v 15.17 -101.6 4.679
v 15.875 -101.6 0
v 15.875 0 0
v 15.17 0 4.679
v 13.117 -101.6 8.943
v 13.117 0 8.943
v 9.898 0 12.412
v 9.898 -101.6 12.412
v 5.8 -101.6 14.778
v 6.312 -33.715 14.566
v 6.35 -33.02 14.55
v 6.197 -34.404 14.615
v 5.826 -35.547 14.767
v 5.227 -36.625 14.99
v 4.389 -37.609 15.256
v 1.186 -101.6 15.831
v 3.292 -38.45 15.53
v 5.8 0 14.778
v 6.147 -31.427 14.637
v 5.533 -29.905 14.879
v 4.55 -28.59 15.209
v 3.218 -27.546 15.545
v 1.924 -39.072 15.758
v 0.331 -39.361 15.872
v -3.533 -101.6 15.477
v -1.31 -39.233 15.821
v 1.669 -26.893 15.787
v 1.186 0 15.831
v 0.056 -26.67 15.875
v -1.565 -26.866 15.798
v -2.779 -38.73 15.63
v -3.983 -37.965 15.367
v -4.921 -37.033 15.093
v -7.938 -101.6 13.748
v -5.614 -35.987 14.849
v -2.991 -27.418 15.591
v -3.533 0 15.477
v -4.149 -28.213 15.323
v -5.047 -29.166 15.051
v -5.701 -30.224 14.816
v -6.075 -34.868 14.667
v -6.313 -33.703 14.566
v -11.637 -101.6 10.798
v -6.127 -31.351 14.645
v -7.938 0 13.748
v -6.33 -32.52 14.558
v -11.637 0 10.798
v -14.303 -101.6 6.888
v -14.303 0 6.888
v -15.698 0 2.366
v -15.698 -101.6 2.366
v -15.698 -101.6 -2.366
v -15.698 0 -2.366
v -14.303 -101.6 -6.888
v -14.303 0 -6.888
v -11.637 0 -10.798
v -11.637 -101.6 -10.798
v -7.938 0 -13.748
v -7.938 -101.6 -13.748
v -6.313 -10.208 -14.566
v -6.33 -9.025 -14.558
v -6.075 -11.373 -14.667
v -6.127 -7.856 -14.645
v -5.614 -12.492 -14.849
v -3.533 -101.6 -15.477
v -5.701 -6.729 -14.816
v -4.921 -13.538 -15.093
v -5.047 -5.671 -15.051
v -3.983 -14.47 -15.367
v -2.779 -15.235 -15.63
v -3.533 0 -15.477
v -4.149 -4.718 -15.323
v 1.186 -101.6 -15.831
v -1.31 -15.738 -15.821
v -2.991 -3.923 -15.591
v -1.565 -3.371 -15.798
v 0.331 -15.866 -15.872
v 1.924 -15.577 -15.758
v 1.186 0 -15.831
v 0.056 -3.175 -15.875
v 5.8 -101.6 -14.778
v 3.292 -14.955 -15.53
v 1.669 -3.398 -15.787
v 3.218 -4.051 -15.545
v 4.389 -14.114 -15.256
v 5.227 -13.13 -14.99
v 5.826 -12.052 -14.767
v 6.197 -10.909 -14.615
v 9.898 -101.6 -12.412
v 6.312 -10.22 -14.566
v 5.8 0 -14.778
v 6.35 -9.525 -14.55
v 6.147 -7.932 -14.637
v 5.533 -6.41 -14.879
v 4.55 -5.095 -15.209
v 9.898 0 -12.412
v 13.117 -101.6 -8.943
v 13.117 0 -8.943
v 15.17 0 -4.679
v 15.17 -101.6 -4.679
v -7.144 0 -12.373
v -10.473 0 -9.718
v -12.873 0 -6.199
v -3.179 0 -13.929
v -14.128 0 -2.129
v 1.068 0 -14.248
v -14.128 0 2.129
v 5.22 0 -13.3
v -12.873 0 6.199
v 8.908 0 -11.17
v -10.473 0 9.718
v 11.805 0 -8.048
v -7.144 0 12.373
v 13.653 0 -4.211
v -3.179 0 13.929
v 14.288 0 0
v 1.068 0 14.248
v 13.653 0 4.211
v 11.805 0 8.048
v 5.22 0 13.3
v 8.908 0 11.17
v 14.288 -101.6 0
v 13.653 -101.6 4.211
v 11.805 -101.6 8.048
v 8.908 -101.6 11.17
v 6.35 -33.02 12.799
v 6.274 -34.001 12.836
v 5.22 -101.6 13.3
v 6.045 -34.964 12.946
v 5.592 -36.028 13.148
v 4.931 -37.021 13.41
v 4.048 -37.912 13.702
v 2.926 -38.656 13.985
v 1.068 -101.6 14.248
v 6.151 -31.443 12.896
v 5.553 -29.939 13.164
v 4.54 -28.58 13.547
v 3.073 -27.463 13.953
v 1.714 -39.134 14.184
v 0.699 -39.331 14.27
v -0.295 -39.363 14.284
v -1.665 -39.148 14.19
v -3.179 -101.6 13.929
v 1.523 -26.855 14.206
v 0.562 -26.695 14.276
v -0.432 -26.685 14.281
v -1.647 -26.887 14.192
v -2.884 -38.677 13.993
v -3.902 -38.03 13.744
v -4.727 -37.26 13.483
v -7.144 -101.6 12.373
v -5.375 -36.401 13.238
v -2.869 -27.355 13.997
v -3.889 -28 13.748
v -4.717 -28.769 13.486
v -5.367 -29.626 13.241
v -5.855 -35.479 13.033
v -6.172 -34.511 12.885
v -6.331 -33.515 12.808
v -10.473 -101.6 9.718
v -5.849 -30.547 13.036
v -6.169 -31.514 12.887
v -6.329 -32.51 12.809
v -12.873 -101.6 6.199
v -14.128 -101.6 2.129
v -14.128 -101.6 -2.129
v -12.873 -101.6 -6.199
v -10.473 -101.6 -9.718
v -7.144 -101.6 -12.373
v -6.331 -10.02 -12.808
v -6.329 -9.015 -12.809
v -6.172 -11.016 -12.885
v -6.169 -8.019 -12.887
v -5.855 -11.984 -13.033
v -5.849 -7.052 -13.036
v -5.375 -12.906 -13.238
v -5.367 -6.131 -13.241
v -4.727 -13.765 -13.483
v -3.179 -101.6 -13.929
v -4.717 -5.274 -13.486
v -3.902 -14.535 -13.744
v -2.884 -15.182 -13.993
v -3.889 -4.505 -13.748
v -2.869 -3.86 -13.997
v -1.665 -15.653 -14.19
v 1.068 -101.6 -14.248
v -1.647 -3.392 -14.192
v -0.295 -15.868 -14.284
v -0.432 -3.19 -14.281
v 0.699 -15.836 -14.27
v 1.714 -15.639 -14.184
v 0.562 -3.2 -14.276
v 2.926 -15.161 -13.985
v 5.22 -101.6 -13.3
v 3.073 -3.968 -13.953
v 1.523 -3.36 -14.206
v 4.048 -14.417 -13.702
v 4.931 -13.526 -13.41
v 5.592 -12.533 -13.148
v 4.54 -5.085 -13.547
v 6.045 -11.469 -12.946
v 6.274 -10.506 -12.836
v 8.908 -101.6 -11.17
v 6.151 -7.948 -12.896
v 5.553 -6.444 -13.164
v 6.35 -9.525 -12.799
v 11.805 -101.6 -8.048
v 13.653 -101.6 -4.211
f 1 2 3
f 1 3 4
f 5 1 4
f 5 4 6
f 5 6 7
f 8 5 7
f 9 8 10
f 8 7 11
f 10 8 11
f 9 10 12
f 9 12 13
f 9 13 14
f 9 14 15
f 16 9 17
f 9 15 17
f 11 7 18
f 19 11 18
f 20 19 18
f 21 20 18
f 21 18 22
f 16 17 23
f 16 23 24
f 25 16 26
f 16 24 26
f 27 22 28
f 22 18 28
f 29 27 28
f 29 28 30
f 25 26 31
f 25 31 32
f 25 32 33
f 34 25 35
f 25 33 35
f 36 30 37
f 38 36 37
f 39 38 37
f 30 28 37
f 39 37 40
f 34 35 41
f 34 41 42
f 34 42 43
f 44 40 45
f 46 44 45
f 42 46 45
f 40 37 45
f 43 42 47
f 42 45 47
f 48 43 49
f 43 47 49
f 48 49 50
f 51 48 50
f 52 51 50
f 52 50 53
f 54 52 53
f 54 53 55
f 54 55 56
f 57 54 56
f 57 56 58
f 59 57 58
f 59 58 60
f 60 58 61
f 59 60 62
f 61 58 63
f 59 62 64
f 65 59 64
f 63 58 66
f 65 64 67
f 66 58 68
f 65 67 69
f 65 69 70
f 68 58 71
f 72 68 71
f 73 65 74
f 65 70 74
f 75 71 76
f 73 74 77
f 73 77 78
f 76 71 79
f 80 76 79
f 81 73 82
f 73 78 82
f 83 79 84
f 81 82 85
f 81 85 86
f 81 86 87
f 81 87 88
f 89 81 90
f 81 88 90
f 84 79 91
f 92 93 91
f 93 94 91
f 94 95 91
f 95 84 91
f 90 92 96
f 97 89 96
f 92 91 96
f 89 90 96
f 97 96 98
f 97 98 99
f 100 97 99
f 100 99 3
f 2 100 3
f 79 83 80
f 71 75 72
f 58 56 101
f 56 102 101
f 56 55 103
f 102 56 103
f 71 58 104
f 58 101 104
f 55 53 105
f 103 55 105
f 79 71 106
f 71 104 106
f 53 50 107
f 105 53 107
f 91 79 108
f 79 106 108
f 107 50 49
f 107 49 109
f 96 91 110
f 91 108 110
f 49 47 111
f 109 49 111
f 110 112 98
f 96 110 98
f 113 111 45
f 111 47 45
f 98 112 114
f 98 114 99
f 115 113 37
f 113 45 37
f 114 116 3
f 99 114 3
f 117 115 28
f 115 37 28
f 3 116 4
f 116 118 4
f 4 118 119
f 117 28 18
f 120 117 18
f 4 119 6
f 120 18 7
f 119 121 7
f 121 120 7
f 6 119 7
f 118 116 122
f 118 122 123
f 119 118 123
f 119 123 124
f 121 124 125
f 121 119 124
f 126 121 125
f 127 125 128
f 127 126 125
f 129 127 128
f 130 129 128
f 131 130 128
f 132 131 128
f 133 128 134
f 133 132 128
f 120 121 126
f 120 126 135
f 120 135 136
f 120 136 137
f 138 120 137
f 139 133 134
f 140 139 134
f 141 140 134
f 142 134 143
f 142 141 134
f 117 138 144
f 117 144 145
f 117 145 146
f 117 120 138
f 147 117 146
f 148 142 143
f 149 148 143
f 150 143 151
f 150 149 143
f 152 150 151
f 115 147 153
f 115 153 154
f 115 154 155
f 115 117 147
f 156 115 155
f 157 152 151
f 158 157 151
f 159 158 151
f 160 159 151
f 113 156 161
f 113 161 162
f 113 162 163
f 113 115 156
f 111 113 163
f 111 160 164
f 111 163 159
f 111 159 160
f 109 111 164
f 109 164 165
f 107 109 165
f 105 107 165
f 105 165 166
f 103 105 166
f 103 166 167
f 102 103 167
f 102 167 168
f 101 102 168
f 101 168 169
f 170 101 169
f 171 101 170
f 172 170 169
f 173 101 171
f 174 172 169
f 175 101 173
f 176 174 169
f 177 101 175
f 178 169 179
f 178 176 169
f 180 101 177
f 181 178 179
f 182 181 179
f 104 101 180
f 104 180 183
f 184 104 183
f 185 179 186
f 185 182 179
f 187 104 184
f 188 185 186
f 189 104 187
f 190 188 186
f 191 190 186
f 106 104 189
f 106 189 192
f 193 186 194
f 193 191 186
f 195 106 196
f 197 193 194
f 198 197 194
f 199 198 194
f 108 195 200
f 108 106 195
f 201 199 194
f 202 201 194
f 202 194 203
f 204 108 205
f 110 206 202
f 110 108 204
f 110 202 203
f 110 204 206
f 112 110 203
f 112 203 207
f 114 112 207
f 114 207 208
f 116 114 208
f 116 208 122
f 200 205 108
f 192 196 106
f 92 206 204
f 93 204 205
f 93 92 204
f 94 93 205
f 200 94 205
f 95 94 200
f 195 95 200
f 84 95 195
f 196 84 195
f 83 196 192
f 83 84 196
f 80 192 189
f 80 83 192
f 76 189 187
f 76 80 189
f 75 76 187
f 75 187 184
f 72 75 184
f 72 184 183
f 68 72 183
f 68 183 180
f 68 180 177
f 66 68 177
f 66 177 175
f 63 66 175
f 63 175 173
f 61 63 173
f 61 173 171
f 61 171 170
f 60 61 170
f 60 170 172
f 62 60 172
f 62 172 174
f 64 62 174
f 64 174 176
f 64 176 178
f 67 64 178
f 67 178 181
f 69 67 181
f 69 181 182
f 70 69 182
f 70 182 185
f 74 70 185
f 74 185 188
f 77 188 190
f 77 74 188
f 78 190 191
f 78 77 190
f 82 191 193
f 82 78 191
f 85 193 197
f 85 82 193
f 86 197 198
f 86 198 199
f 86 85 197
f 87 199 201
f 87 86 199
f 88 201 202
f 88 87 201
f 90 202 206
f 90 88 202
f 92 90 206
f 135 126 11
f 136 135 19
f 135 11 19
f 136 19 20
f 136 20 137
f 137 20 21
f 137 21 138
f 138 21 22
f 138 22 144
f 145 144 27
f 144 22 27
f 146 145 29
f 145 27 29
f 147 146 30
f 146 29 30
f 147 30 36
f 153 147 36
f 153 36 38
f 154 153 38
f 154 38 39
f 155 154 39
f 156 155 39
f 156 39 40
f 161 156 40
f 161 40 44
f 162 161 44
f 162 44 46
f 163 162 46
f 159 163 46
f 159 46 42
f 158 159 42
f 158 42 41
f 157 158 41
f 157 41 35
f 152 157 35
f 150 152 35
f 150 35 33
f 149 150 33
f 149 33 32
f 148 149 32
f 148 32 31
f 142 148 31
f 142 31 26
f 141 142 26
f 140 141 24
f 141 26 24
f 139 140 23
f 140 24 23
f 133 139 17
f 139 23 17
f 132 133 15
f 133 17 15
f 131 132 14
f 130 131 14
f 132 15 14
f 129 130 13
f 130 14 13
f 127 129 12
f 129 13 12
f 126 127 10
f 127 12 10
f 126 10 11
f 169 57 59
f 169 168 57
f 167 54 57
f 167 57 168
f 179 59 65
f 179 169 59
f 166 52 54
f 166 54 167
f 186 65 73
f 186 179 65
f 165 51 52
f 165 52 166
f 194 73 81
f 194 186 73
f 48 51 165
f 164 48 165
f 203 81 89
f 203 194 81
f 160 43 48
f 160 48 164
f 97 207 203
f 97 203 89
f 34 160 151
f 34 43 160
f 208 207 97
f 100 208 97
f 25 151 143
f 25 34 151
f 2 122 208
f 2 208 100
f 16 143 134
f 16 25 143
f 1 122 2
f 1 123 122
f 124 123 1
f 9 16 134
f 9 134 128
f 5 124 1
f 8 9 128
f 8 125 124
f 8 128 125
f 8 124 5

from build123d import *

# Parameters (mm, degrees)
F0_R     = 15.875
F0_R_2   = 14.2875
F1_DEPTH = 101.6
F3_R     = 6.35
F4_DEPTH = 25.4
F6_R     = 6.35
F7_DEPTH = 25.4


with BuildPart() as f1:
    # F0 (on Front) → F1 (new body)
    with BuildSketch(Plane.XZ):
        Circle(F0_R)
        Circle(F0_R_2, mode=Mode.SUBTRACT)
    extrude(amount=F1_DEPTH)

    # F3 (on offset) → F4 (cut)
    with BuildSketch(Plane.XY.offset(28.575)):
        with Locations((0, -33.02)):
            Circle(F3_R)
    extrude(amount=-F4_DEPTH, mode=Mode.SUBTRACT)

    # F6 (on offset) → F7 (cut)
    with BuildSketch(Plane.XY.offset(-28.575)):
        with Locations((0, -9.525)):
            Circle(F6_R)
    extrude(amount=F7_DEPTH, mode=Mode.SUBTRACT)


solid = f1.part
